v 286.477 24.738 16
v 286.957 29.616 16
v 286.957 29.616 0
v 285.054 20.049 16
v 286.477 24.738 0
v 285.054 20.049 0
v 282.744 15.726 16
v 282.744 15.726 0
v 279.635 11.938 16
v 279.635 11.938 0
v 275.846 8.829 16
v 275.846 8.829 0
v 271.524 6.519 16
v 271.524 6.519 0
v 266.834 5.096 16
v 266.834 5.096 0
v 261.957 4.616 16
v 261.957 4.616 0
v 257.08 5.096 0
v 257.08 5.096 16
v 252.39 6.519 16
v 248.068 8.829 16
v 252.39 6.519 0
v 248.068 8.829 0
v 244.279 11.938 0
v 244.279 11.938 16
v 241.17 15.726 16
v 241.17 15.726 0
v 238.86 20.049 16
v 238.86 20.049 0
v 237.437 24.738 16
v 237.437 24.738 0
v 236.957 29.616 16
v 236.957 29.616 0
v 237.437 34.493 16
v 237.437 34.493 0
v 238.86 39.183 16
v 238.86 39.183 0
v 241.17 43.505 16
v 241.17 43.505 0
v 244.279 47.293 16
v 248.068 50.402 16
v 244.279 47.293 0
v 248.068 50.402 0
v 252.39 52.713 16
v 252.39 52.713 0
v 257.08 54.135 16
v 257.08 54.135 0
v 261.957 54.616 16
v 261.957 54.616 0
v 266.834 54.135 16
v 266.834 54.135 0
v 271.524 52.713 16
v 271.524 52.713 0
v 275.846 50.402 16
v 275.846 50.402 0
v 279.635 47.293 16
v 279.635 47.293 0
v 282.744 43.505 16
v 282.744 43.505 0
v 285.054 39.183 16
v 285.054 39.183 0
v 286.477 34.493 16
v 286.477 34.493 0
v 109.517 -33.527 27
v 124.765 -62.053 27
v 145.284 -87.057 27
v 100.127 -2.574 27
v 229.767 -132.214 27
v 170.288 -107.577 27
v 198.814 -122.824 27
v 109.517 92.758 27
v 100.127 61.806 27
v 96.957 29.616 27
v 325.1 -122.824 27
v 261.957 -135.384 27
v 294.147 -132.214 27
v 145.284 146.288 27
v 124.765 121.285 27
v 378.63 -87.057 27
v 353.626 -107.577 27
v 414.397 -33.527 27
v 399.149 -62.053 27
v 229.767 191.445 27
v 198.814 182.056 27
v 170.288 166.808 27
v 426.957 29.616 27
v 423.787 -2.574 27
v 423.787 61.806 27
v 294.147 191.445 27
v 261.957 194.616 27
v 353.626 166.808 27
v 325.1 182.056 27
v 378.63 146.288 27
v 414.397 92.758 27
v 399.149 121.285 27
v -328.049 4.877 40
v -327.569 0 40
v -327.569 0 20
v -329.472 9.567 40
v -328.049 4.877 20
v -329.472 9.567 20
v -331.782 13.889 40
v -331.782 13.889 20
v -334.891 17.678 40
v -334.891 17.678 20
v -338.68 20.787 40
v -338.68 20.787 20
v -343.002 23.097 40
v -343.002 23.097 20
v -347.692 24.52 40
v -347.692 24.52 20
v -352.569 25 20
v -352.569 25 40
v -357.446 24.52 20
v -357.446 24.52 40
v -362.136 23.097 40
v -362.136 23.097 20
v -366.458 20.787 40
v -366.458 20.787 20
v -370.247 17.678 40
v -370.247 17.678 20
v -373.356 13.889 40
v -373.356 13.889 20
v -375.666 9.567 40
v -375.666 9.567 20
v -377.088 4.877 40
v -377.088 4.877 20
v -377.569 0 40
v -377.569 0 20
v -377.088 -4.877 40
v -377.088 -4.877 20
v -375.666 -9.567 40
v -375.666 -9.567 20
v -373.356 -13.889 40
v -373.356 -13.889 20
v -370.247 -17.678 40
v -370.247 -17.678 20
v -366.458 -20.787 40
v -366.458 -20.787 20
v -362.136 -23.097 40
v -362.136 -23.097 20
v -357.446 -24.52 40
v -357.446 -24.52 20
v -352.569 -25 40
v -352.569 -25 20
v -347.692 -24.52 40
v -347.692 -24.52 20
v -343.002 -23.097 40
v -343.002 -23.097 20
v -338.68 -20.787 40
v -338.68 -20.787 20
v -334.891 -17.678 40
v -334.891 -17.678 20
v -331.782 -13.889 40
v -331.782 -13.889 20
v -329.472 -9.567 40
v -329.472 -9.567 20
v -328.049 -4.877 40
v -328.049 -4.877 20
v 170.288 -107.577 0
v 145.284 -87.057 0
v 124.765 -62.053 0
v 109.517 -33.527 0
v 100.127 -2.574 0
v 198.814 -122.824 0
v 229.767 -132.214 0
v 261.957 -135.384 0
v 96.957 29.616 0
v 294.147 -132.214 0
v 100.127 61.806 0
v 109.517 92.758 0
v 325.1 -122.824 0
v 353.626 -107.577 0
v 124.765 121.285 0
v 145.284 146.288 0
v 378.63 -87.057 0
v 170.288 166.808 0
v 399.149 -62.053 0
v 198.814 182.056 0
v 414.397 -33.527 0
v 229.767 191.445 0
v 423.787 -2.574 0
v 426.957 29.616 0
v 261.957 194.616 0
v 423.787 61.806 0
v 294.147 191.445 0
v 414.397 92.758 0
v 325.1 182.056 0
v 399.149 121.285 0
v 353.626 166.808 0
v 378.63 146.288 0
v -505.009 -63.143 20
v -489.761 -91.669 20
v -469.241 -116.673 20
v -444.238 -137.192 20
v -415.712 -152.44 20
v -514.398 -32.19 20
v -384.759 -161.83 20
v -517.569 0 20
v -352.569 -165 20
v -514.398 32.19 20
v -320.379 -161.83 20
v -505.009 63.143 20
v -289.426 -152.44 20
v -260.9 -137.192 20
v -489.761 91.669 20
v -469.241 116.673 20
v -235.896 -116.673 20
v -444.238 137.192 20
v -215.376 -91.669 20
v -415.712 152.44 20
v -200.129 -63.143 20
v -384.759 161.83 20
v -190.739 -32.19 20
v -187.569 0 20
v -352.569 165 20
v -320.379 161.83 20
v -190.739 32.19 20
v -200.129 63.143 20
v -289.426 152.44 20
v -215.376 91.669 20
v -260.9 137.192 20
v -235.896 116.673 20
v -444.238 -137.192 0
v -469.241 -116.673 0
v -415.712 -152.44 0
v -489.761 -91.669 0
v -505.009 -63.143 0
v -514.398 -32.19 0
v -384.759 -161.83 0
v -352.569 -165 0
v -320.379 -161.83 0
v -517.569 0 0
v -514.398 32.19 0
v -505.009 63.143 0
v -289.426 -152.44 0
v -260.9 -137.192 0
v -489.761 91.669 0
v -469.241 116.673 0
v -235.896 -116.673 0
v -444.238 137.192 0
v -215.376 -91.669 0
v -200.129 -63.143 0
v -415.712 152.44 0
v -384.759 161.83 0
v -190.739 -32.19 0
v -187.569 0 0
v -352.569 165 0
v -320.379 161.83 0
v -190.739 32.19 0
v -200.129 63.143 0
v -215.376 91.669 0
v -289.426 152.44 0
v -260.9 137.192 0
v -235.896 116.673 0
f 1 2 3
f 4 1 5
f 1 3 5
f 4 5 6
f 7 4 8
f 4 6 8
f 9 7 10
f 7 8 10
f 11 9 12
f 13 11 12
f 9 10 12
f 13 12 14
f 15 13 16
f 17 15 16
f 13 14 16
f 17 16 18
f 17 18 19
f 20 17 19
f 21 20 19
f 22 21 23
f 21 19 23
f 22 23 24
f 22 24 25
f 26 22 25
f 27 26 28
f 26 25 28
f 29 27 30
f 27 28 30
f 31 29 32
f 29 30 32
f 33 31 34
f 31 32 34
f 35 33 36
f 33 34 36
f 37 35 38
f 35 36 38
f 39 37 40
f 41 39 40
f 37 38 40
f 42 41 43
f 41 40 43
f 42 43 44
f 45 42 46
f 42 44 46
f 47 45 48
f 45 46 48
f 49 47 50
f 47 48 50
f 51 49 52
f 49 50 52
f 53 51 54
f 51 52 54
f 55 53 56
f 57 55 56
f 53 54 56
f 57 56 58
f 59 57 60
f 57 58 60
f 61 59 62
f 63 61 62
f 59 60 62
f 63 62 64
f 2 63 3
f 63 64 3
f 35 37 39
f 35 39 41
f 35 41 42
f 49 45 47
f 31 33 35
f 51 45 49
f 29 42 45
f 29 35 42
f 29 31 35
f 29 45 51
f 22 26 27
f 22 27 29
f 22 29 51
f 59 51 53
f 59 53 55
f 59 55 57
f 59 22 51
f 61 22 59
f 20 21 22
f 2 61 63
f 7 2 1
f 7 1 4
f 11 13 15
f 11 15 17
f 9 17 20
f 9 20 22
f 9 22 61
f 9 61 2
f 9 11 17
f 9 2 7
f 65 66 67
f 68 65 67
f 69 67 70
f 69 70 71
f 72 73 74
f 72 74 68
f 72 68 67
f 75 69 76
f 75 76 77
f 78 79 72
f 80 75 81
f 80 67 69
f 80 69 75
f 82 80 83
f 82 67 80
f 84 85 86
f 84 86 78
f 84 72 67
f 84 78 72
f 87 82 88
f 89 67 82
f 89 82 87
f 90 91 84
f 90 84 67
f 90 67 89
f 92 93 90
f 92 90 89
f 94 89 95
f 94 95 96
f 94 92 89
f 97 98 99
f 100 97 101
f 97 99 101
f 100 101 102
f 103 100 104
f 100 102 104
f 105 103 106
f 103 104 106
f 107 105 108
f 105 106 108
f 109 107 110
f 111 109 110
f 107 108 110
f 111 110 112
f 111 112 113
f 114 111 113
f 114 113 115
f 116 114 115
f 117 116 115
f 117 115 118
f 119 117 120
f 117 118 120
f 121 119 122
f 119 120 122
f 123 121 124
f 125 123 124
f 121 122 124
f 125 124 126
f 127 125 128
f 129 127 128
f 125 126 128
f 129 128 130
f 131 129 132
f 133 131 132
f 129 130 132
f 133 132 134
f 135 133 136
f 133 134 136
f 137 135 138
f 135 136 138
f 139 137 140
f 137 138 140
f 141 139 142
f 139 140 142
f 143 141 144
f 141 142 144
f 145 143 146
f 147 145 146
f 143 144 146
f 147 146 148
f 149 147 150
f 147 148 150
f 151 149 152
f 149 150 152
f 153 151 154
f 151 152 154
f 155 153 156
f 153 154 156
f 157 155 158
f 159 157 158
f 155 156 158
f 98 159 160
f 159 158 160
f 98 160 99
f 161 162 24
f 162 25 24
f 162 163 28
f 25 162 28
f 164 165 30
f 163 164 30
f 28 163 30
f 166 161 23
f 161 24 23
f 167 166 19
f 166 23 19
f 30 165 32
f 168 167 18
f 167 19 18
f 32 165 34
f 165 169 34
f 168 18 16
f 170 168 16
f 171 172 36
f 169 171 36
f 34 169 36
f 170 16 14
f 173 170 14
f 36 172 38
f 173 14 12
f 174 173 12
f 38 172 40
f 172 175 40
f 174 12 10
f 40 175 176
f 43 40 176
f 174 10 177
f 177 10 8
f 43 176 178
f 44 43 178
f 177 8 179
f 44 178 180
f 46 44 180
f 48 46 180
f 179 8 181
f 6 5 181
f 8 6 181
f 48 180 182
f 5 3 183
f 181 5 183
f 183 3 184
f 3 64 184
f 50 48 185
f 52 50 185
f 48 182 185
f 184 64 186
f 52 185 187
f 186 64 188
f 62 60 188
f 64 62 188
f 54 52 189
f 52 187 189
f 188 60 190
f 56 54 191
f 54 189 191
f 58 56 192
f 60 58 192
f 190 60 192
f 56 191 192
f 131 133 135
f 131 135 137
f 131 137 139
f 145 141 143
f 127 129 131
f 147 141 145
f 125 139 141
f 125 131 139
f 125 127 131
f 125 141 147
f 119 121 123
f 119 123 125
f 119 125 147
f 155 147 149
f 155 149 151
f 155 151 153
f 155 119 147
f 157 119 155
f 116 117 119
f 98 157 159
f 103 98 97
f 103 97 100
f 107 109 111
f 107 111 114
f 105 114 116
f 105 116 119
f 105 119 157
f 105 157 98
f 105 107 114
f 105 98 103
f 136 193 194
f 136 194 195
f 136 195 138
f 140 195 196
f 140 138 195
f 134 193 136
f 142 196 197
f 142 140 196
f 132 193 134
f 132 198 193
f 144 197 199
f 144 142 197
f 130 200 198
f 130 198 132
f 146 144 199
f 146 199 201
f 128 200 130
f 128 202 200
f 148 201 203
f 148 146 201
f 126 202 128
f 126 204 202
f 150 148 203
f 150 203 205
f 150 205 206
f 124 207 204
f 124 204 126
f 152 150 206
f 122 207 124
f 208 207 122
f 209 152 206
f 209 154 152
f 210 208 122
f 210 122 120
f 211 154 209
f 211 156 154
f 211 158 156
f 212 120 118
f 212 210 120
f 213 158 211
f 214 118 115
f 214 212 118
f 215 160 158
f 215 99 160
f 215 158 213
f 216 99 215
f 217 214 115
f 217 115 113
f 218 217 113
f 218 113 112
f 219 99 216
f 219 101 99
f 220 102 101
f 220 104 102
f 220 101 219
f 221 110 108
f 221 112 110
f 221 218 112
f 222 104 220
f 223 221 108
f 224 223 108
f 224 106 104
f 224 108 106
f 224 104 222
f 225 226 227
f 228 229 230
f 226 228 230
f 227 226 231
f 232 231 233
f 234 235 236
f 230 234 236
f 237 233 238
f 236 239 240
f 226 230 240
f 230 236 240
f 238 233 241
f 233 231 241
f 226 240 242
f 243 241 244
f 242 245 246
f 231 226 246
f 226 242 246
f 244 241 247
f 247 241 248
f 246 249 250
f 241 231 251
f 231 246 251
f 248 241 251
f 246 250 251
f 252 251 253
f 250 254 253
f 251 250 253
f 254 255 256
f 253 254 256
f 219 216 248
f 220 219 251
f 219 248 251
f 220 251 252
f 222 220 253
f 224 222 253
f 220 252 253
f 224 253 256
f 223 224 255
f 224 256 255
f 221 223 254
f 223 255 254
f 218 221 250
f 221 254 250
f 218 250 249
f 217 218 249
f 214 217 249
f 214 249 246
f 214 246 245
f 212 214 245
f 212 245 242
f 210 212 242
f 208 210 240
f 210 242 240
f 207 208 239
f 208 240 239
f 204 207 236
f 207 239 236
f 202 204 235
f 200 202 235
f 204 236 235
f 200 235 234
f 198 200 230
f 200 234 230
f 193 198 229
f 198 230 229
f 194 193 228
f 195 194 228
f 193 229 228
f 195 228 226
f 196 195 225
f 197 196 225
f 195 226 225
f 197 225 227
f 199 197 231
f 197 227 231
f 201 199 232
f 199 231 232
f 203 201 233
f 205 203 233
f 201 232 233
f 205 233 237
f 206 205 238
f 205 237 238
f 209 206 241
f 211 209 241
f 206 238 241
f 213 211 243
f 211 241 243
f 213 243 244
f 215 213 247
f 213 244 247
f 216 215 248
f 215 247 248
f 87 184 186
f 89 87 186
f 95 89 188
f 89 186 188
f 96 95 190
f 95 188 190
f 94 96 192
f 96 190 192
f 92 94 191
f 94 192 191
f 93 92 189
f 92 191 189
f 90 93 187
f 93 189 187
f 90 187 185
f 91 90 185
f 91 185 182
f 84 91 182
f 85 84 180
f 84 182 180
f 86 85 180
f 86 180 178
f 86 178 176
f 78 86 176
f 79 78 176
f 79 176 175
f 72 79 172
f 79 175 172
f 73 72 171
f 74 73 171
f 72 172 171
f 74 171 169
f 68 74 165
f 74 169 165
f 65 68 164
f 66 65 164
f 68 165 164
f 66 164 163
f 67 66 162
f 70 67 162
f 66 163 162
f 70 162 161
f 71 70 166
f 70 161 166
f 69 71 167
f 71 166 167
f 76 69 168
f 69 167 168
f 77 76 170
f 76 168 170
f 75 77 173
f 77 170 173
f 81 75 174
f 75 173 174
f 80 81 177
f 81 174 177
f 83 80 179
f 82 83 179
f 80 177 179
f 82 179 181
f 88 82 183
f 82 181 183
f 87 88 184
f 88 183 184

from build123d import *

# Parameters (mm, degrees)
F0_R     = 165
F1_DEPTH = 20
F2_R     = 165
F3_DEPTH = 27
F4_R     = 25
F5_DEPTH = 20
F6_R     = 25
F7_DEPTH = 16


with BuildPart() as f1:
    # F0 (on Top) → F1 (new body)
    with BuildSketch(Plane.XY):
        with Locations((-352.568833, 0)):
            Circle(F0_R)
    extrude(amount=F1_DEPTH)

    # F4 (on face) → F5 (join)
    with BuildSketch(Plane.XY.offset(20)):
        with Locations((-352.568833, 0)):
            Circle(F4_R)
    extrude(amount=F5_DEPTH)


with BuildPart() as f3:
    # F2 (on Top) → F3 (new body)
    with BuildSketch(Plane.XY):
        with Locations((261.95699, 29.615719)):
            Circle(F2_R)
    extrude(amount=F3_DEPTH)

    # F6 (on face) → F7 (cut)
    with BuildSketch(Plane(origin=(0, 0, 0), x_dir=(1, 0, 0), z_dir=(0, 0, -1))):
        with Locations((261.95699, -29.615719)):
            Circle(F6_R)
    extrude(amount=-F7_DEPTH, mode=Mode.SUBTRACT)


solid = Compound([f1.part, f3.part])
